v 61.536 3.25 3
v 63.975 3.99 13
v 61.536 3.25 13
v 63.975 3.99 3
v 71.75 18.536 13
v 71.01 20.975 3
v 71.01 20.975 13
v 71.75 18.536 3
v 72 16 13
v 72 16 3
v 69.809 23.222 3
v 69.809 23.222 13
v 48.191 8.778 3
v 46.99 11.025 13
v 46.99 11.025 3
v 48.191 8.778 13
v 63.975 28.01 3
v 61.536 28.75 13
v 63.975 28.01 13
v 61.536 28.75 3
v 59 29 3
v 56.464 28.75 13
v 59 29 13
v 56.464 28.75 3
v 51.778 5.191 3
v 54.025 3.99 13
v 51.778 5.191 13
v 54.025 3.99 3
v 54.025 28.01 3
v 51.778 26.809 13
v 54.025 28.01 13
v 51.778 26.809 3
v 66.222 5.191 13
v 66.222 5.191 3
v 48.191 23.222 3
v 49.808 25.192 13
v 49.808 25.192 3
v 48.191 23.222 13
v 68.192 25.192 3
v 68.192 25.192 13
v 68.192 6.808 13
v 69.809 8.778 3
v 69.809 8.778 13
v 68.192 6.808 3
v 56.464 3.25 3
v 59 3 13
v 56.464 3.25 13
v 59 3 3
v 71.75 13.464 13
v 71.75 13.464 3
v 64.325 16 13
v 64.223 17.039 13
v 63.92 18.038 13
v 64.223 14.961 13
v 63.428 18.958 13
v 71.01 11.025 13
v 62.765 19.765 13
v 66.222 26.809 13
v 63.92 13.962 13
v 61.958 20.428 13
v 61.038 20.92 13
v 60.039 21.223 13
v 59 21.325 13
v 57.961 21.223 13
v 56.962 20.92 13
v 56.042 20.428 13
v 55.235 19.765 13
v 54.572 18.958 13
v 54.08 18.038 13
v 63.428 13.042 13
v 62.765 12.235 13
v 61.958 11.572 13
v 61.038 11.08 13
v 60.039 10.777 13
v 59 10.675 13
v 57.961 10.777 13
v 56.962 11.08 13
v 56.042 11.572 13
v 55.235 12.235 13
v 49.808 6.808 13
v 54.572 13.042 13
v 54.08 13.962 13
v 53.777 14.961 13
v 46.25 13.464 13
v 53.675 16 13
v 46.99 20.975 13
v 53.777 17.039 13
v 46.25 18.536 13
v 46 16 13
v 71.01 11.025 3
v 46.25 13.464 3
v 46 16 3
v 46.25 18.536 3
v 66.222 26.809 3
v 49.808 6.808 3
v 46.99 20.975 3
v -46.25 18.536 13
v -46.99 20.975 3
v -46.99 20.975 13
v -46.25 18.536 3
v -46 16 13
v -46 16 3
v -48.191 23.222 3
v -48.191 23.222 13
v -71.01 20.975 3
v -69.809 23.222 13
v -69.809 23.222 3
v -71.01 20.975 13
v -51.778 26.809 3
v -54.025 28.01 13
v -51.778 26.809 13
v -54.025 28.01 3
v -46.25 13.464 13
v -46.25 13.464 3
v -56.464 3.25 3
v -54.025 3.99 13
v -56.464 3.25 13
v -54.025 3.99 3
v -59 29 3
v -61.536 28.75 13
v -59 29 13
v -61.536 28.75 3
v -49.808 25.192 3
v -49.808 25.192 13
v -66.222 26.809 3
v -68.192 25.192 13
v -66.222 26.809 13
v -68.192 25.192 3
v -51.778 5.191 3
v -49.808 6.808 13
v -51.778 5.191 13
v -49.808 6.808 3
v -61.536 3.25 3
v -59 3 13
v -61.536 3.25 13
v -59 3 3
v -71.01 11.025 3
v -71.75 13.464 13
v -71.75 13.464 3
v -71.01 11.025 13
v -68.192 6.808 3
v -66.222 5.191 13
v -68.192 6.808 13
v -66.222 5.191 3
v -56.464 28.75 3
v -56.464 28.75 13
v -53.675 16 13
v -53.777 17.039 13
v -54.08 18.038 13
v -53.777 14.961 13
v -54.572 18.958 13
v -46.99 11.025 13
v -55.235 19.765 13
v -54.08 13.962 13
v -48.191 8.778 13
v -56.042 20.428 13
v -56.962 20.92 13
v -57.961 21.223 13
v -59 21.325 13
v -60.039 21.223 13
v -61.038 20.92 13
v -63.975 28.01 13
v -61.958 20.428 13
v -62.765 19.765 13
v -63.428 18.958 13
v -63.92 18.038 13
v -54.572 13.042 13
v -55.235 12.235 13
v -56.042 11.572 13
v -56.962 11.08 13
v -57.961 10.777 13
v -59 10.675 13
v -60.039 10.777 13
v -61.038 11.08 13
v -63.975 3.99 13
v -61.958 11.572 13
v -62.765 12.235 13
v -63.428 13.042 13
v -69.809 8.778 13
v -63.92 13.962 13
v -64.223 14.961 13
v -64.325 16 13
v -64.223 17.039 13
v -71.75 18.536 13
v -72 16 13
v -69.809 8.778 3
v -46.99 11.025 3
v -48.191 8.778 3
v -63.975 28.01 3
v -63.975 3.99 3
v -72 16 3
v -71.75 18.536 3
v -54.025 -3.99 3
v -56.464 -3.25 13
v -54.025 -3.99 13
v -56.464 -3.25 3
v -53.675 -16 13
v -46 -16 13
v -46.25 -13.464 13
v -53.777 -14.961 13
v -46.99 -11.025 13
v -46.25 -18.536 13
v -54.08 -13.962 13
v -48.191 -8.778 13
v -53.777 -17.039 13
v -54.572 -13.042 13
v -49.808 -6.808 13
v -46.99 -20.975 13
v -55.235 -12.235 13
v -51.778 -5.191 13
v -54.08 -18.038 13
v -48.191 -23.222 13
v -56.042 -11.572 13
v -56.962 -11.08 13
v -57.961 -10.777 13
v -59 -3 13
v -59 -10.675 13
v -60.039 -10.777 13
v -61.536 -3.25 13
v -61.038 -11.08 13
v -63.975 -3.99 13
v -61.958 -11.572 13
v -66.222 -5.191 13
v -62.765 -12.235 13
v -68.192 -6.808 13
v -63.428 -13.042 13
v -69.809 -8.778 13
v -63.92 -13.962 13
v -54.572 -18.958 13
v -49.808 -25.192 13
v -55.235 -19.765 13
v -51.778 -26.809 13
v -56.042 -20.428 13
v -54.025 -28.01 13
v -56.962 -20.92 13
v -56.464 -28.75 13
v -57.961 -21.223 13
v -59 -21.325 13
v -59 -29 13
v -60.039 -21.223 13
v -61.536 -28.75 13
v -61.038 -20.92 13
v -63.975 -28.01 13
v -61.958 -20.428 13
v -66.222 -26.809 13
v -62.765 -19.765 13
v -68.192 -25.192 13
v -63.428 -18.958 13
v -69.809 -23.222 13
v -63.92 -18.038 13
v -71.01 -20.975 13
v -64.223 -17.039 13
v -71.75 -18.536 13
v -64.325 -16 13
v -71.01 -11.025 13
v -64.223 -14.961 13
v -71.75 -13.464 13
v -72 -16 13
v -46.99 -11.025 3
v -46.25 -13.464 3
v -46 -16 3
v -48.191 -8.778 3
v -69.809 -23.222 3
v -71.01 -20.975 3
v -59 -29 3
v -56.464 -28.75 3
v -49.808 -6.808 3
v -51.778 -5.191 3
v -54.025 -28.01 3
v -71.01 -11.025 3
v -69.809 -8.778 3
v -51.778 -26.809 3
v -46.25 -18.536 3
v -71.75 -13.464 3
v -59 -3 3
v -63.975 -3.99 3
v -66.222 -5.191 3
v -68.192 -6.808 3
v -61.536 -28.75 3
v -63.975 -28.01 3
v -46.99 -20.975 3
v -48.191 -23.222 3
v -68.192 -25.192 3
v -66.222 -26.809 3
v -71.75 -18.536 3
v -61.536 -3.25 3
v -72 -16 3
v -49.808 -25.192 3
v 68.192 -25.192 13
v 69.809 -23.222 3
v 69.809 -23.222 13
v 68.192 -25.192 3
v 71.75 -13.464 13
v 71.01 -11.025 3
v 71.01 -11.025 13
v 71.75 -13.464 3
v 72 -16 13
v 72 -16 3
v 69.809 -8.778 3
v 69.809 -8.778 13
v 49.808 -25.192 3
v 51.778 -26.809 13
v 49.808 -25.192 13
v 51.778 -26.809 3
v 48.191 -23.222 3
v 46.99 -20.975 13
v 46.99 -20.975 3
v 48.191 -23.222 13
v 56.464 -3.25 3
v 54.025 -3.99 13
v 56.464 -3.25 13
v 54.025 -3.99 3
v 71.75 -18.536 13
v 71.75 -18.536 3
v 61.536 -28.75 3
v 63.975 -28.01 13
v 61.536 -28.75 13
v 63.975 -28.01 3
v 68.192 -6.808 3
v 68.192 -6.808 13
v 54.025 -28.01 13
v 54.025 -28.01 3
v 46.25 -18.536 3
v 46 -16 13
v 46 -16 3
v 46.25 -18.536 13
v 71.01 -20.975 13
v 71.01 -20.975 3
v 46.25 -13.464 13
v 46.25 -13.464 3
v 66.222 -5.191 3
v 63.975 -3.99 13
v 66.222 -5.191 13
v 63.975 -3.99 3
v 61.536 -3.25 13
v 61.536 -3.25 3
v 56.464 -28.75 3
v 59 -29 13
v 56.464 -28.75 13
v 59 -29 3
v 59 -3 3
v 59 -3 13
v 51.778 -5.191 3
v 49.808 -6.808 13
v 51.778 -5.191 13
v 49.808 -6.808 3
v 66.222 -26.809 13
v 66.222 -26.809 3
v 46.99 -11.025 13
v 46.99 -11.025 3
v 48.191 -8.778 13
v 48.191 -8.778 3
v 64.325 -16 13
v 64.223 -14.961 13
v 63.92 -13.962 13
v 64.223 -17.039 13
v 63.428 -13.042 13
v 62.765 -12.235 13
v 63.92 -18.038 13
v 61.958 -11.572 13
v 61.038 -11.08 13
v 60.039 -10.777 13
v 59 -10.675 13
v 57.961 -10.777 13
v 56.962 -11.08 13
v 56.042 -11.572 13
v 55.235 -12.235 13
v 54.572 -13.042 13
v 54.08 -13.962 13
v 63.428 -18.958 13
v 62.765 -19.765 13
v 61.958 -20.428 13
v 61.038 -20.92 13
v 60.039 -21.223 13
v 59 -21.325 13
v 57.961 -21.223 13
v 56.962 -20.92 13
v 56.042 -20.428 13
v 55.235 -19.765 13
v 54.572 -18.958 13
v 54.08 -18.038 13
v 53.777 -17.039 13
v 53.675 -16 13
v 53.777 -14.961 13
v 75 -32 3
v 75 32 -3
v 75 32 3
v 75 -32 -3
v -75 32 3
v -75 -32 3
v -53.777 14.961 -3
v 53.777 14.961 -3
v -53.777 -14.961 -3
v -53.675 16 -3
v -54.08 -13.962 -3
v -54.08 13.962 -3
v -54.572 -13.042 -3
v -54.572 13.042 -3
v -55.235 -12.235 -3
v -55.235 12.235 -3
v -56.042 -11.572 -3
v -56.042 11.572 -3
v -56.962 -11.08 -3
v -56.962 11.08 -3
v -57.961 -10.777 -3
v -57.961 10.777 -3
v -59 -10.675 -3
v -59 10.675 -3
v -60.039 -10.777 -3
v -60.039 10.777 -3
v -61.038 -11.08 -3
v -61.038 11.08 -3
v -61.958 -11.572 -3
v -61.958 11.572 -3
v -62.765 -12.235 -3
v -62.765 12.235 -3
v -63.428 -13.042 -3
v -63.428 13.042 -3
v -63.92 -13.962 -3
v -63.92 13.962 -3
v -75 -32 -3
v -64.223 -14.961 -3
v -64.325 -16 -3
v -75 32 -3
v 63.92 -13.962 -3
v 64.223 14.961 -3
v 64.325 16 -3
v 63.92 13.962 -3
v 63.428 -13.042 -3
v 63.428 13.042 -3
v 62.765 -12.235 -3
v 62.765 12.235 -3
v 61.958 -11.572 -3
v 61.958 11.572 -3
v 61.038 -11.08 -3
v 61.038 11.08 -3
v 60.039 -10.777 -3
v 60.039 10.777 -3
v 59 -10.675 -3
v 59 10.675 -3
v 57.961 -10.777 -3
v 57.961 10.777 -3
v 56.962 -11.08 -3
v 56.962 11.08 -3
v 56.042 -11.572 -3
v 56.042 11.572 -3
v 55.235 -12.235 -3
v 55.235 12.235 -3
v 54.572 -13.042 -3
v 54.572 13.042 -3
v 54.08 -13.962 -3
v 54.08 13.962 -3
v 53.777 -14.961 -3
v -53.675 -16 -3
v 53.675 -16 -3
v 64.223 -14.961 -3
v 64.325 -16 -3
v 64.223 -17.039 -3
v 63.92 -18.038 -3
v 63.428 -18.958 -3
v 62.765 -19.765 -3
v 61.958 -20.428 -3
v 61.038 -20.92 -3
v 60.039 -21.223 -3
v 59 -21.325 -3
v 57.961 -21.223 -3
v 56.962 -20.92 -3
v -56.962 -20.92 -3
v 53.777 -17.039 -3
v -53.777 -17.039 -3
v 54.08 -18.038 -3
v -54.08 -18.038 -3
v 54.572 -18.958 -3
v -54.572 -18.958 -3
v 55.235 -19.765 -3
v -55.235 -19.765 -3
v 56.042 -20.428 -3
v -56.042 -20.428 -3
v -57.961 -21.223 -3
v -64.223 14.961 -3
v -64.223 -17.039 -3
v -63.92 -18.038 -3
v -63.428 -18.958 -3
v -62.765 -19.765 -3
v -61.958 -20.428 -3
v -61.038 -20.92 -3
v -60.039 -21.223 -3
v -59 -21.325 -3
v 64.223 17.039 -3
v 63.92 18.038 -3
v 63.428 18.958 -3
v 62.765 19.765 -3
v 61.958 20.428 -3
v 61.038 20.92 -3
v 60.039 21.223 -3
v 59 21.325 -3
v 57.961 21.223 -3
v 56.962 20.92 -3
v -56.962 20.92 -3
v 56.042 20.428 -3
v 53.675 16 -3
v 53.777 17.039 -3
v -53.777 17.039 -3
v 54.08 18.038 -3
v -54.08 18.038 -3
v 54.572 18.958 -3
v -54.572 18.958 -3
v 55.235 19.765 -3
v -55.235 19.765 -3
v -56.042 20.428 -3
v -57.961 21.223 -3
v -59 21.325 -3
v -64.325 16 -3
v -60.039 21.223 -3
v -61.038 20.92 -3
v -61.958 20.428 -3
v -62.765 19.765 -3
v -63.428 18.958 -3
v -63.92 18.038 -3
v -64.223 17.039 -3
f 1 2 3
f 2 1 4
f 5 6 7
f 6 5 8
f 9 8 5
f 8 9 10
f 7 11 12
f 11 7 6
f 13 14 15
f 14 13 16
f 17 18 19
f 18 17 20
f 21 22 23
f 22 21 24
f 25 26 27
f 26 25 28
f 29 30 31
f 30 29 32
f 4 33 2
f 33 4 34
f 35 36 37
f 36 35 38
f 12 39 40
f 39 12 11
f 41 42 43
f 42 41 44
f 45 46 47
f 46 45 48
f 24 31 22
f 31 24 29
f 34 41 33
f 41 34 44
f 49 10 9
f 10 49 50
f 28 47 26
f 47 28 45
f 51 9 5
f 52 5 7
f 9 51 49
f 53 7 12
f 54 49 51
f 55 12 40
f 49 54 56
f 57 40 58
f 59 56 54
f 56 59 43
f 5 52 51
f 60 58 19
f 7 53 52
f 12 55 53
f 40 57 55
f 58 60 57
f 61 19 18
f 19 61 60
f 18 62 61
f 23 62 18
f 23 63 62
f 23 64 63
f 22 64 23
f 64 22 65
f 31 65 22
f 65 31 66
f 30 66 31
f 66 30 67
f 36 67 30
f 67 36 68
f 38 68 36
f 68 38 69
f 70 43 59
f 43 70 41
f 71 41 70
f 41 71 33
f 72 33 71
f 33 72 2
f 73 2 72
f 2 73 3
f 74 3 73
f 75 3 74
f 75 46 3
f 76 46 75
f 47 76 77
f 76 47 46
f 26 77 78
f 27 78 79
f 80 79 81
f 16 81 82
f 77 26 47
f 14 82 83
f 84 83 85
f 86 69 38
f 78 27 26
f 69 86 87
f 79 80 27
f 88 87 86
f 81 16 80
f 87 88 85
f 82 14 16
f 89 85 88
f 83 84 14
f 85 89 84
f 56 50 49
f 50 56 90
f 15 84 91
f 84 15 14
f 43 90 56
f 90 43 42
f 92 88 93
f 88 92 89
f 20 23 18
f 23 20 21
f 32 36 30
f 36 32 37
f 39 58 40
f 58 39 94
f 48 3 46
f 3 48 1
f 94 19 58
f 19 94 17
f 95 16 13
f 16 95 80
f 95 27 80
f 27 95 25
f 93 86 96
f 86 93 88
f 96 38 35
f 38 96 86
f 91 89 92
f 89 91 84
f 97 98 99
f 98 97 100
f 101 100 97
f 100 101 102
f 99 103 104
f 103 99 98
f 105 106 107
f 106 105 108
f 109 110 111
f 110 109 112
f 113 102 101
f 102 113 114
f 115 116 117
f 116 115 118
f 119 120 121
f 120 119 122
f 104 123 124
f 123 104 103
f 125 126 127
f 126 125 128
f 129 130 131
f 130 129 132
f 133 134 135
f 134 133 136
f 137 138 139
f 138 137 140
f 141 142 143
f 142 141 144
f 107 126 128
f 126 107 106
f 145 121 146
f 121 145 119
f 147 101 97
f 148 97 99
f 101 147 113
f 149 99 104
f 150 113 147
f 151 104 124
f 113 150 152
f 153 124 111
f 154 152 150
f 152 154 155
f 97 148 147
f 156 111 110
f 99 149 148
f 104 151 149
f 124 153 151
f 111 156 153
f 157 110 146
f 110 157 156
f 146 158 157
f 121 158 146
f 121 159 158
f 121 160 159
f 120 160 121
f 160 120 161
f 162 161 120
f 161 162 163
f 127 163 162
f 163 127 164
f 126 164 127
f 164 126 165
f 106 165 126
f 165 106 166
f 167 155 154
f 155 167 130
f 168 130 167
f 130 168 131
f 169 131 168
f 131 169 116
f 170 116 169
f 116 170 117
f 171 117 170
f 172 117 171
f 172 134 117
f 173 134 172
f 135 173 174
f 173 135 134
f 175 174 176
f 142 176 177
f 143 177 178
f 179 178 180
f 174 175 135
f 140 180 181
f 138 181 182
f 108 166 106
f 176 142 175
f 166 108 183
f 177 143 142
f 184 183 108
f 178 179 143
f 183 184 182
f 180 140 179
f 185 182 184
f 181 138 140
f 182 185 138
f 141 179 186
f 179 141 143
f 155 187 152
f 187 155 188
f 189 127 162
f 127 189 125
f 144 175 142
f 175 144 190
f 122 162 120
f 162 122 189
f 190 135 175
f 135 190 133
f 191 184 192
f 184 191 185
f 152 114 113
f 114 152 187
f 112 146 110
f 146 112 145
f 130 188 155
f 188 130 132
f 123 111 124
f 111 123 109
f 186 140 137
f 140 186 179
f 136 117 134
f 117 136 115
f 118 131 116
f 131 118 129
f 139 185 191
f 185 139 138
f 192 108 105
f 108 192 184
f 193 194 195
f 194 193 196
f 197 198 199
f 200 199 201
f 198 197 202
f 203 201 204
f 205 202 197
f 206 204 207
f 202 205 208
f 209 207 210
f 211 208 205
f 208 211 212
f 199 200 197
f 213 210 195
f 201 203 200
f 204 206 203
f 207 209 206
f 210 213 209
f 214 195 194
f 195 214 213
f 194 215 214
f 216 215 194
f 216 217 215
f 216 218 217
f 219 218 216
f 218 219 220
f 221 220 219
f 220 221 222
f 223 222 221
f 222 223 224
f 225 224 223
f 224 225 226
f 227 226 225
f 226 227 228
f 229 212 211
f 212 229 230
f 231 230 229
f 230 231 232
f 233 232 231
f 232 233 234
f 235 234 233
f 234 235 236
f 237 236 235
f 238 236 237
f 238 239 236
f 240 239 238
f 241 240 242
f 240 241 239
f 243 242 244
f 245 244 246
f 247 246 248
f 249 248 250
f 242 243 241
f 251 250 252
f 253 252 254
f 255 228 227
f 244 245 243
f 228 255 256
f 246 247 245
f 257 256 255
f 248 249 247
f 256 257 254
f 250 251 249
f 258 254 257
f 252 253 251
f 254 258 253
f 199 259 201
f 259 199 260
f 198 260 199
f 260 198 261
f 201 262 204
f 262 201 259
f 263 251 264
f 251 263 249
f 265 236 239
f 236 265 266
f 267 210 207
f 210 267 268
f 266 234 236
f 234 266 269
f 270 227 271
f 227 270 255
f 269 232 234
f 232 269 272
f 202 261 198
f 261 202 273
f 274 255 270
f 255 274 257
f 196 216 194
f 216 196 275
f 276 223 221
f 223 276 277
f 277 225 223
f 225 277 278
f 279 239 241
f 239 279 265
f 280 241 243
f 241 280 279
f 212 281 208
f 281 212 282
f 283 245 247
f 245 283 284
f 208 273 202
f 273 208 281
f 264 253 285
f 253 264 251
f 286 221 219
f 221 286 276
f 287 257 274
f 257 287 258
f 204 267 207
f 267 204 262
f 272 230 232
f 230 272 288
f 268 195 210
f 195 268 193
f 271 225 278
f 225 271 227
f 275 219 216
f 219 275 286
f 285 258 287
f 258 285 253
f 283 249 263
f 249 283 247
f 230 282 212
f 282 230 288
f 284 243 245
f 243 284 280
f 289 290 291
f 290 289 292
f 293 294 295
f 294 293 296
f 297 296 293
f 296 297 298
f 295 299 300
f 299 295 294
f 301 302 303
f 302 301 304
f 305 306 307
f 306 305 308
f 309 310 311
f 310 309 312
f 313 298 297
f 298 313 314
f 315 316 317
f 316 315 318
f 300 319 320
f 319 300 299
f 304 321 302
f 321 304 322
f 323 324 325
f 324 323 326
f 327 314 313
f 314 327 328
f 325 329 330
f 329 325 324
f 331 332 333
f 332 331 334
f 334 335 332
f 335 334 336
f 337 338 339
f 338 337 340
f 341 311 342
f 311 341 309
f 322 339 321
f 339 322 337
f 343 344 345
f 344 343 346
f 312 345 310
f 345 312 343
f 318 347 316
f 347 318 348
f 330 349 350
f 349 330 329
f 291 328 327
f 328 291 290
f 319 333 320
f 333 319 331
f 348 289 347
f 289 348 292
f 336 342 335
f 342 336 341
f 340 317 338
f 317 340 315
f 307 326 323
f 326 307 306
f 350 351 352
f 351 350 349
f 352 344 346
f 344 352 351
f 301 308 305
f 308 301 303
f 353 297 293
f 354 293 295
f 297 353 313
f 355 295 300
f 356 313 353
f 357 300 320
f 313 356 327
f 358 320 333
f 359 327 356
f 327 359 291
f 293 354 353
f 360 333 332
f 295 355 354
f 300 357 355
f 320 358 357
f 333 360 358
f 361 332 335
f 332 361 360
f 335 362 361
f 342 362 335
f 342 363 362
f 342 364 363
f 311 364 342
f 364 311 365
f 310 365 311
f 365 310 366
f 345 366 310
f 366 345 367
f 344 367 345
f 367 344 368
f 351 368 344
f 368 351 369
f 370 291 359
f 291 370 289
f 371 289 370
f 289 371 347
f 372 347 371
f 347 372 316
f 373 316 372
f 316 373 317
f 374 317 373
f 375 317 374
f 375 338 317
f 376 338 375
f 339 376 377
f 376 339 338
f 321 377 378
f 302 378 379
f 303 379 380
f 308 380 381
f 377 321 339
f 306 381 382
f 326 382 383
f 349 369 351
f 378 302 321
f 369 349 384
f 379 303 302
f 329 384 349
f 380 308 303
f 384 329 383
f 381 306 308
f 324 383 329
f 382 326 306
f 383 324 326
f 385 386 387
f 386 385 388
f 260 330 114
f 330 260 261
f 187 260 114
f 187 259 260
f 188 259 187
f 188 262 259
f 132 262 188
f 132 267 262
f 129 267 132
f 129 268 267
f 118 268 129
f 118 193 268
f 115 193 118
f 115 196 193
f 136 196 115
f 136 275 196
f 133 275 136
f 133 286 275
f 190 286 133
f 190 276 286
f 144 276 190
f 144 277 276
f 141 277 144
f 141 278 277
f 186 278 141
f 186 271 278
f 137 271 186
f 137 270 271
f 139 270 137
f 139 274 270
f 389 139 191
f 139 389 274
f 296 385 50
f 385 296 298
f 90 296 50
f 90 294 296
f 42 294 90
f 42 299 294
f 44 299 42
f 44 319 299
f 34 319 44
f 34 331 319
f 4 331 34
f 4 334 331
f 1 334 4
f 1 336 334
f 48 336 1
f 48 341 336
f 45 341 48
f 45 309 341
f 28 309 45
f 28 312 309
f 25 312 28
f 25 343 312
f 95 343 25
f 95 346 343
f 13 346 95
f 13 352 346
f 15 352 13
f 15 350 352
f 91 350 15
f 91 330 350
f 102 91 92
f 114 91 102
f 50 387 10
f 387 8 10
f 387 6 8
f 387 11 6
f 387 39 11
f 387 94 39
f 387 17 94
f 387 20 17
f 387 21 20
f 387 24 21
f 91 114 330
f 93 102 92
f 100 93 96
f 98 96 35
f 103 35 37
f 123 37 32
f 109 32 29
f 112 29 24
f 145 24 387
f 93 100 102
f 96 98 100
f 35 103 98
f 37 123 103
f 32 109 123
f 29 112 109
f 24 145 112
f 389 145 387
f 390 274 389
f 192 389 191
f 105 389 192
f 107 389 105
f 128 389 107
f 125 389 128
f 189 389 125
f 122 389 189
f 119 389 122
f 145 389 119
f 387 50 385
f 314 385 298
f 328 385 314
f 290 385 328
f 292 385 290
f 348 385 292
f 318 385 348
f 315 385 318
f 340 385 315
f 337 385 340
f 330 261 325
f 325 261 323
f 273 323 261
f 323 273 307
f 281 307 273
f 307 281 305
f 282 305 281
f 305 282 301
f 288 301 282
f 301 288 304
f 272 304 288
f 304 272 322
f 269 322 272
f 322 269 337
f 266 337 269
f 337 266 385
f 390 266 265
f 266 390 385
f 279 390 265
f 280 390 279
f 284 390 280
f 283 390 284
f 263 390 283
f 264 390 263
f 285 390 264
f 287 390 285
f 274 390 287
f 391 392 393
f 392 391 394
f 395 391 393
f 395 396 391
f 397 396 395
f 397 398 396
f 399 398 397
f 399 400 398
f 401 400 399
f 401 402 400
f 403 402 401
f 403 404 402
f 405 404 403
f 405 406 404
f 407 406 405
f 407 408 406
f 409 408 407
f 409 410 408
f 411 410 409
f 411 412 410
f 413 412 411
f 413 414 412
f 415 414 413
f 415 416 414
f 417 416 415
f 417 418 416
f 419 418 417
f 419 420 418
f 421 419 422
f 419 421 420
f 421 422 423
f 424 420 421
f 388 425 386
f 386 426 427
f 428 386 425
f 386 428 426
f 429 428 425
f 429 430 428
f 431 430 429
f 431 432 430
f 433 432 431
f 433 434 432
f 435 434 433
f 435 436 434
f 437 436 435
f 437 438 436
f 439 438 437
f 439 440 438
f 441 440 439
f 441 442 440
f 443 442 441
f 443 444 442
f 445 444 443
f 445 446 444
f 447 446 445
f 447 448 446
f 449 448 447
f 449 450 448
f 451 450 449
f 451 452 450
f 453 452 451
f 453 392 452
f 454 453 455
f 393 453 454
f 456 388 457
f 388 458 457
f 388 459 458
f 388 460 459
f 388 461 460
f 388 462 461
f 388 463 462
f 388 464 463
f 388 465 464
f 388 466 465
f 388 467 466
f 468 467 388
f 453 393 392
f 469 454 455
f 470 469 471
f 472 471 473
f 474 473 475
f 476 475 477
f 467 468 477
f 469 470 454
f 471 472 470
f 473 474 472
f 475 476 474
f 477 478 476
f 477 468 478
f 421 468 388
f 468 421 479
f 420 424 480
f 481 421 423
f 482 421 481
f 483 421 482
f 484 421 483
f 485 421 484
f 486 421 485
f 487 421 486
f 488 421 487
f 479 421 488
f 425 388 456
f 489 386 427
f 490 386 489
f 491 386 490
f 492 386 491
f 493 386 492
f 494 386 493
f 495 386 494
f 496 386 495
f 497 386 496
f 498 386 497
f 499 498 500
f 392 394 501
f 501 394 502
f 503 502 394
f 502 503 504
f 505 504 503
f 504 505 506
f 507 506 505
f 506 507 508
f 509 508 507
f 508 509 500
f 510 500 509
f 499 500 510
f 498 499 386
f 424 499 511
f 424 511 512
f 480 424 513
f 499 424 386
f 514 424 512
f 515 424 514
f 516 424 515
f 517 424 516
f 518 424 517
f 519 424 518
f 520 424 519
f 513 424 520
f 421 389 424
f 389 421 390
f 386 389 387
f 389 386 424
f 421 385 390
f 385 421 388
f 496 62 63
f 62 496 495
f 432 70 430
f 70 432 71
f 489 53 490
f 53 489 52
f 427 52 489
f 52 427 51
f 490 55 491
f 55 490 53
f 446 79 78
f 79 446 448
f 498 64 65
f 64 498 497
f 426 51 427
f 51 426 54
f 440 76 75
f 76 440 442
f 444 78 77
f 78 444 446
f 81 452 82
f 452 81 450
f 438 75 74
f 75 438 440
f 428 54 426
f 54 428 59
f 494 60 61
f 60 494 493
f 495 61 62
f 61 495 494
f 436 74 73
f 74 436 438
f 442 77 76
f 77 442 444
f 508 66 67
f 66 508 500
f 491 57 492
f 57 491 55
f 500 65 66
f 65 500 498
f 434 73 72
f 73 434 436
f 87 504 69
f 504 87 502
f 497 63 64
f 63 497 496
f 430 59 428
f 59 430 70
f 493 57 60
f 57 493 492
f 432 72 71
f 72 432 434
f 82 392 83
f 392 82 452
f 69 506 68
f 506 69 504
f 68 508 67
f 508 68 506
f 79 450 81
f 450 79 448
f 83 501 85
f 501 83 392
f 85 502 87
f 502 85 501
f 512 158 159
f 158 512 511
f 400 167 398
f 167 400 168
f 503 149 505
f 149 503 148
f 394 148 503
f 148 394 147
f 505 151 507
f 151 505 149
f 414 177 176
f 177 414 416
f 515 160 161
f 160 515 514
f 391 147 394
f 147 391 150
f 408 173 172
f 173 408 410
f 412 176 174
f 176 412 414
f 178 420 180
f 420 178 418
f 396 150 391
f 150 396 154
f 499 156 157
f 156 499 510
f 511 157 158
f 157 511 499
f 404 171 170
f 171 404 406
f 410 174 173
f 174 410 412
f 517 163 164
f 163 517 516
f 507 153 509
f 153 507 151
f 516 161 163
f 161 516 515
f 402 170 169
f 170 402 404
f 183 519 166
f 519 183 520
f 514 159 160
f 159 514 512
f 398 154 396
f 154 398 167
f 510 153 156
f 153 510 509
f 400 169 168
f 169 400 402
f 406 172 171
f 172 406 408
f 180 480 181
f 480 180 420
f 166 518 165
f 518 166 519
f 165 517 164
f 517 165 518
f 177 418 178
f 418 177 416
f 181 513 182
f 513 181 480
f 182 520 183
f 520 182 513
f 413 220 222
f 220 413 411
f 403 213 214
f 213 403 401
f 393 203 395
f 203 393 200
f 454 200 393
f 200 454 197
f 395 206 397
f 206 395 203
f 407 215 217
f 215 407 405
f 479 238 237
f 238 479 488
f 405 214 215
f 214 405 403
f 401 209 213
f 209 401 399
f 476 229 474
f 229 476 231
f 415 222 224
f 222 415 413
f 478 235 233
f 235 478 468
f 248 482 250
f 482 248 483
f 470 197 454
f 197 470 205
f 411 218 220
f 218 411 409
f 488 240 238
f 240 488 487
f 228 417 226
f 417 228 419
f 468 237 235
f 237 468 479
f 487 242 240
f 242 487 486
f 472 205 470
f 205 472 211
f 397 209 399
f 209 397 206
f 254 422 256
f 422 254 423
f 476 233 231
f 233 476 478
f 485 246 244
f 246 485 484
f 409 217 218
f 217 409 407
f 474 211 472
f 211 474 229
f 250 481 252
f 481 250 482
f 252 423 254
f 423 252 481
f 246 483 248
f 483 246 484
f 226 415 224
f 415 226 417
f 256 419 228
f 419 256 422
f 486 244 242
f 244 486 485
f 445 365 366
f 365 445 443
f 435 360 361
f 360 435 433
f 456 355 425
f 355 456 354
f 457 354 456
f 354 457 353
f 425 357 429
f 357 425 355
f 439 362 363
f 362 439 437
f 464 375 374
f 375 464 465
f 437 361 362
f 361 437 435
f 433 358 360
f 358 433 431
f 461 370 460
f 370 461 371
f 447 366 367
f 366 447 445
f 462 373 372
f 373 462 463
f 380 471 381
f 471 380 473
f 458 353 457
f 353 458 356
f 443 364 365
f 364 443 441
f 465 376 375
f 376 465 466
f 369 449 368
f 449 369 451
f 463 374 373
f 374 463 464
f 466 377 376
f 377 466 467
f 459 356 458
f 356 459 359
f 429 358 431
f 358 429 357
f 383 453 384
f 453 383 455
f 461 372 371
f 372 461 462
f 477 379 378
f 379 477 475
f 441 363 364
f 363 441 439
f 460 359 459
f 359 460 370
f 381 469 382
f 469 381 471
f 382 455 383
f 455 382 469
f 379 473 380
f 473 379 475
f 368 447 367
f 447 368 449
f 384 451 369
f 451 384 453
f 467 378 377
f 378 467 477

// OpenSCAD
$fn = 32;

// ----------------------------------------------------------------------
// Anchor pads 150 x 64 x 16
// four corner bosses with anchor holes
// ----------------------------------------------------------------------

// --- parameters (mm) ---
plate = [150, 64, 6];    // base plate size (x, y, z)
pads = 4;                // boss count, one per corner
edge = 16;               // boss centre offset from the plate edge
boss_d = 26;             // boss diameter
boss_h = 10;             // boss height above the base plate
bore_d = 10.5;           // nominal hole diameter from the drawing
print_allowance = 0.15;  // clearance added for printing

// --- derived feature positions (mm) ---
hole_d = bore_d + print_allowance;  // = 10.65   hole diameter as printed
height = plate[2] + boss_h;         // = 16   overall height of the part
corner_x = plate[0] / 2 - edge;     // = 59   boss centre X
corner_y = plate[1] / 2 - edge;     // = 16   boss centre Y
feature_centers = [
  [corner_x, corner_y],
  [-corner_x, corner_y],
  [-corner_x, -corner_y],
  [corner_x, -corner_y]
];   // boss centres, anchor holes are drilled there

// base plate, four bosses standing on it, anchor holes all the way through
difference() {
  union() {
    cube(plate, center = true);
    for (centre = feature_centers)
      translate([centre[0], centre[1], plate[2] / 2 - 1])
        cylinder(d = boss_d, h = boss_h + 1);
  }
  for (centre = feature_centers)
    translate([centre[0], centre[1], -height])
      cylinder(d = hole_d, h = 2 * height + 2);  // through boss and plate
}
